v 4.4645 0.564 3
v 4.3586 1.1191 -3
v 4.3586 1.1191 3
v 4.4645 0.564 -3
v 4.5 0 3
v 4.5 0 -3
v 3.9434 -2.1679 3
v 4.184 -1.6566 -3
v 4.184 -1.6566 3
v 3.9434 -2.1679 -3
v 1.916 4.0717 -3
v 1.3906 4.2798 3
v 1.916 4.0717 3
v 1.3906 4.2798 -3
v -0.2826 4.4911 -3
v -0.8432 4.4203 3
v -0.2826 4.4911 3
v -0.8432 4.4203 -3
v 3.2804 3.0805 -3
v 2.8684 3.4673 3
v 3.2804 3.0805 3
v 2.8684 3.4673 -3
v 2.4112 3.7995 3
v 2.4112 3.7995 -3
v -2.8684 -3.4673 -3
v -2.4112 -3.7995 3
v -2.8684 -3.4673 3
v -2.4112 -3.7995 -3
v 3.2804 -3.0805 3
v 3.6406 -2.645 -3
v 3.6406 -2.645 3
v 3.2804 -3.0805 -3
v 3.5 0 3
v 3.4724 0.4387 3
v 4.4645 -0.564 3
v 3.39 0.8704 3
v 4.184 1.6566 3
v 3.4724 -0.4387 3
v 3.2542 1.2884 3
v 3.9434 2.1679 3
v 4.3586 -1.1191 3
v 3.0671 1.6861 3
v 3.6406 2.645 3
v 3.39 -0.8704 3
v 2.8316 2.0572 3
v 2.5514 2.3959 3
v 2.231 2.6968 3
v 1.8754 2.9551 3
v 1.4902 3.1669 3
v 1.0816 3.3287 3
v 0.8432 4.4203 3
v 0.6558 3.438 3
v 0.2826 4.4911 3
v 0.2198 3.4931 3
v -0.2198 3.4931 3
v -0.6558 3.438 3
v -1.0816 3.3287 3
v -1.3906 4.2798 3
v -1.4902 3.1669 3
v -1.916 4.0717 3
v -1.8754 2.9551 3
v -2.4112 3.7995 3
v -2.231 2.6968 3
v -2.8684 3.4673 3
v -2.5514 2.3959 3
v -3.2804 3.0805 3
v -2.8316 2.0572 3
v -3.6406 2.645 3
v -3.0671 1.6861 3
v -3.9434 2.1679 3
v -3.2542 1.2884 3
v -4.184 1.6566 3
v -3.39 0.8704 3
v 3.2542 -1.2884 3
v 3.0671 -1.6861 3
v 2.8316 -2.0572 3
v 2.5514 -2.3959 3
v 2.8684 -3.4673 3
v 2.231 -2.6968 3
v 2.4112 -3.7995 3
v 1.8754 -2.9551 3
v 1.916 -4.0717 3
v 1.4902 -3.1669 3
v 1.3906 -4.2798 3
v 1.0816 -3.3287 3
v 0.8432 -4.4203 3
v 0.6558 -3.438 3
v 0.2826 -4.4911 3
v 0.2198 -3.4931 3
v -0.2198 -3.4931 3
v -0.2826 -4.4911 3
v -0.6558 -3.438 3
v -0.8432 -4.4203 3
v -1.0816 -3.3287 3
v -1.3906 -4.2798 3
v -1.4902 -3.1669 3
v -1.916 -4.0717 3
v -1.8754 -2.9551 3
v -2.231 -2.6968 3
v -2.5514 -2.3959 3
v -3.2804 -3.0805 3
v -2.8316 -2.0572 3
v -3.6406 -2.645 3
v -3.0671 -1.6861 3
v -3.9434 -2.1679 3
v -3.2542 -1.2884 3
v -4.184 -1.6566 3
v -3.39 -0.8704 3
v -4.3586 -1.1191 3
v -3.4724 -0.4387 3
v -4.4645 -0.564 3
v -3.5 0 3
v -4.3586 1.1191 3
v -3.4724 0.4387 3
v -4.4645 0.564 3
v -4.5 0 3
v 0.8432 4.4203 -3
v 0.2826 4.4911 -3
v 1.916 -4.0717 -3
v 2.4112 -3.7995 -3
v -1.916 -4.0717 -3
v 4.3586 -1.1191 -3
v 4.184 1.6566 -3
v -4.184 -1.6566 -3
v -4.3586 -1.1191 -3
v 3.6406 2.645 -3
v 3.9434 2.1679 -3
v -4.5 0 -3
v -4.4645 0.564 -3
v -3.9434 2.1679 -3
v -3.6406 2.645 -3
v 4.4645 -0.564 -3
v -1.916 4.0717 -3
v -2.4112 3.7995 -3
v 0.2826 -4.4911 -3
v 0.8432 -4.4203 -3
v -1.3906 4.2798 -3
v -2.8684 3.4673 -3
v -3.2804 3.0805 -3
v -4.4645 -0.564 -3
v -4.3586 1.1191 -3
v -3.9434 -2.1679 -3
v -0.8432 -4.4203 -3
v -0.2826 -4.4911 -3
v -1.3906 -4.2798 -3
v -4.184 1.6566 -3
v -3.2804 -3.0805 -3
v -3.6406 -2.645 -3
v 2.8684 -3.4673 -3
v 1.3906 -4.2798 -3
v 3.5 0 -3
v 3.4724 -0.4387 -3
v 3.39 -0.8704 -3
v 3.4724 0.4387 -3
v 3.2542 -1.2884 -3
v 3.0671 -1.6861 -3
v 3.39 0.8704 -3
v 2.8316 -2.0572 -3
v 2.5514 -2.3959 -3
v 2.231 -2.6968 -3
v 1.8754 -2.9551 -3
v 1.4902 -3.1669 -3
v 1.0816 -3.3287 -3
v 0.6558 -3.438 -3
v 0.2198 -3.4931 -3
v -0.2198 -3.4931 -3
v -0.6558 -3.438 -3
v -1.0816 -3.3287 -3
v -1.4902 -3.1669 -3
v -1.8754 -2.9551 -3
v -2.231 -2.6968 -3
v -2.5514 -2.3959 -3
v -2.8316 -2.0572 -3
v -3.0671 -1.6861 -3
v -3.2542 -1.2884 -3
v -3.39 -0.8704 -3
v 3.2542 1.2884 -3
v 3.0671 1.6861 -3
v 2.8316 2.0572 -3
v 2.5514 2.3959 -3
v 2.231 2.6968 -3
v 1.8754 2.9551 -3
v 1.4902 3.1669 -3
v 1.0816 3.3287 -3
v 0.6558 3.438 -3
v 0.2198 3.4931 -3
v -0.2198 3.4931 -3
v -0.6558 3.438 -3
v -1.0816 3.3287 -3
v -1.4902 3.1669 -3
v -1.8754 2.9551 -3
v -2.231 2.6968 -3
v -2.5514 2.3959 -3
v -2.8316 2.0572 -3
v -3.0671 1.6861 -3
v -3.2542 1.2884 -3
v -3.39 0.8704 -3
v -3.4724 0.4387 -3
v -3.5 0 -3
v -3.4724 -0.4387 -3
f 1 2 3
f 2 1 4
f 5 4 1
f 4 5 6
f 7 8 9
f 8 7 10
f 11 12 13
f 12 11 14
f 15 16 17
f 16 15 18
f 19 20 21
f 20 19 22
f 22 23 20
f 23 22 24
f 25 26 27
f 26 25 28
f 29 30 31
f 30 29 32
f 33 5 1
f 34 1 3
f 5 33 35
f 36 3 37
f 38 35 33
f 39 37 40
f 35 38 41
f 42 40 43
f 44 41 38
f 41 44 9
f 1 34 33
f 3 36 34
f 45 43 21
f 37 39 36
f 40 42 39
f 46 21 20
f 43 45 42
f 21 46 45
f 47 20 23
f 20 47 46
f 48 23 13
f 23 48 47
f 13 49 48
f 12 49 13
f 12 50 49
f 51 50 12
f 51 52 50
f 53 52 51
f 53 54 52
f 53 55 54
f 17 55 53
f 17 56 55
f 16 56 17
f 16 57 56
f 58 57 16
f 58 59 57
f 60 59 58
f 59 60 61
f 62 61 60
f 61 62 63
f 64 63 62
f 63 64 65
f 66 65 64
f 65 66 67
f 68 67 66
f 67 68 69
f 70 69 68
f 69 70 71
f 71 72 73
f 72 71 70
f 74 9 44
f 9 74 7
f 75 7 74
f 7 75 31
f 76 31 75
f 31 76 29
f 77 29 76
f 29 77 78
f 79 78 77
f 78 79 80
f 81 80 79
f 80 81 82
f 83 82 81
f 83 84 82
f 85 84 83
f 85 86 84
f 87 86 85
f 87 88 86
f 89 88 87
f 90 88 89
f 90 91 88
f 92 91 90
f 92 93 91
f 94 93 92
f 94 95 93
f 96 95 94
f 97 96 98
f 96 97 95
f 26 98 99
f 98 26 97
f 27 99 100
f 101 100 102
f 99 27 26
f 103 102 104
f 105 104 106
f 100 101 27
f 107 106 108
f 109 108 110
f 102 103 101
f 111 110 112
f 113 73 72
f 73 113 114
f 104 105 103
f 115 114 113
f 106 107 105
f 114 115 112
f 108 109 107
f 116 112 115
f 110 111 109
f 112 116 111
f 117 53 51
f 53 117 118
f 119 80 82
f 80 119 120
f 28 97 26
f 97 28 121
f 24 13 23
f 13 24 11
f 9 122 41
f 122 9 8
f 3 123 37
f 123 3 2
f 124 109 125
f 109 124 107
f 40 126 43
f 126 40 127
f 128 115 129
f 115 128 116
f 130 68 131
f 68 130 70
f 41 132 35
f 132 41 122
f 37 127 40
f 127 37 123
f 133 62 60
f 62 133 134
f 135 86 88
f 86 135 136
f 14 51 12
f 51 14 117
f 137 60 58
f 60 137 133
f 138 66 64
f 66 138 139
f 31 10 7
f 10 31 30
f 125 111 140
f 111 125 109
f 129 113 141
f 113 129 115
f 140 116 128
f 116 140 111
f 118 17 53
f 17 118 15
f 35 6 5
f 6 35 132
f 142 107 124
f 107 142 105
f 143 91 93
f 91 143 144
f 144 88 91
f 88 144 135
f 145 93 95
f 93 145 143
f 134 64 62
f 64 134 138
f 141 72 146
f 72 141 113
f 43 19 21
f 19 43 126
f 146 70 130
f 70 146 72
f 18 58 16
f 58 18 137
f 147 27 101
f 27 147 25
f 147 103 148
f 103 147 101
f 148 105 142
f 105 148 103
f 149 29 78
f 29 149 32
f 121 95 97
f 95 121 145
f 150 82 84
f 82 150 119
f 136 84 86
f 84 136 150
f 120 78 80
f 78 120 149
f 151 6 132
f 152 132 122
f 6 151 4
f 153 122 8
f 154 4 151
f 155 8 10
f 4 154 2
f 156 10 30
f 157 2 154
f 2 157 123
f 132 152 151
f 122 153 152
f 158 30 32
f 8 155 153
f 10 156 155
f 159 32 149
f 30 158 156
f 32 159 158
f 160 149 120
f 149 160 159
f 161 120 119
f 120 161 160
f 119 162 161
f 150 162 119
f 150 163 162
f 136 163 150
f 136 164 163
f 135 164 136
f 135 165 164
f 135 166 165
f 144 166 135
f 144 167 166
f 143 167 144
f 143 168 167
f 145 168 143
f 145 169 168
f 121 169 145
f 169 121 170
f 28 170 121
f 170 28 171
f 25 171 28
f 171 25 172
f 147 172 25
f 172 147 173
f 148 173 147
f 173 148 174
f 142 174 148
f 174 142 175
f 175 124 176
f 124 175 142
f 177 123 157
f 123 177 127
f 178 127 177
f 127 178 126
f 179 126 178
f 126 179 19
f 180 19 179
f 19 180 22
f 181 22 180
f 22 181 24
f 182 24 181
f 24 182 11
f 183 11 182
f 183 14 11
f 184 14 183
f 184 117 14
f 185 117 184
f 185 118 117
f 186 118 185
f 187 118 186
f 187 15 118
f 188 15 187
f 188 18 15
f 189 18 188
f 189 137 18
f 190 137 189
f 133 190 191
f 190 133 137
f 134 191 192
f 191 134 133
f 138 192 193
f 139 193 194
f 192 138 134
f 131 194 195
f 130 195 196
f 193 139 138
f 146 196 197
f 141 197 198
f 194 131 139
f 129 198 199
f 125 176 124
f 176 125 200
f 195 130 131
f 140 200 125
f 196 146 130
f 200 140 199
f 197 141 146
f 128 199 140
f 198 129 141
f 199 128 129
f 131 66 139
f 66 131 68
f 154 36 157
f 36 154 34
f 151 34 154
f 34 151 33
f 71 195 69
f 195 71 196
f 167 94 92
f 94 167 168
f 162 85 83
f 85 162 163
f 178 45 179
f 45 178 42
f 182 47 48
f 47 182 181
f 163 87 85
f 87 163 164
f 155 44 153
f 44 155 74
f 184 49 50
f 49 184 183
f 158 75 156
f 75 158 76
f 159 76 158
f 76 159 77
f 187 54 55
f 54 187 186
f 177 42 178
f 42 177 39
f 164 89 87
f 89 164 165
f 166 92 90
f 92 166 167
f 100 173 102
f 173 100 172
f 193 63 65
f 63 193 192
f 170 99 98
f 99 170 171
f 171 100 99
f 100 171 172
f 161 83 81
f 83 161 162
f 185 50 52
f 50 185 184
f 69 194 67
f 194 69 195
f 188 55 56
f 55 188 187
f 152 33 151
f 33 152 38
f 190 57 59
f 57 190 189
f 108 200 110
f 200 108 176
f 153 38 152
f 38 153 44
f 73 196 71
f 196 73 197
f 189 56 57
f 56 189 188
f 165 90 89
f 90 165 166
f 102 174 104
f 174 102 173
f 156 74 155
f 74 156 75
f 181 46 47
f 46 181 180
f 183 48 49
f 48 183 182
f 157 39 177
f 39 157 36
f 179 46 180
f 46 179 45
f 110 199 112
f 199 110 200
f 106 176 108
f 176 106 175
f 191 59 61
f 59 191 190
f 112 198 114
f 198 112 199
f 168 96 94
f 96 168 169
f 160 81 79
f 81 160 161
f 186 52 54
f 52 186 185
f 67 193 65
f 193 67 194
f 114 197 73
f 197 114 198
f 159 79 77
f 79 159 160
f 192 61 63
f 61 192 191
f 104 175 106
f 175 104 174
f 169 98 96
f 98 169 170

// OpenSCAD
$fn = 50;


difference() {
	union() {
		translate(v = [0, 0, -3.0000000000]) {
			cylinder(h = 6, r = 4.5000000000);
		}
	}
	union() {
		translate(v = [0, 0, -100.0000000000]) {
			cylinder(h = 200, r = 3.5000000000);
		}
	}
}
